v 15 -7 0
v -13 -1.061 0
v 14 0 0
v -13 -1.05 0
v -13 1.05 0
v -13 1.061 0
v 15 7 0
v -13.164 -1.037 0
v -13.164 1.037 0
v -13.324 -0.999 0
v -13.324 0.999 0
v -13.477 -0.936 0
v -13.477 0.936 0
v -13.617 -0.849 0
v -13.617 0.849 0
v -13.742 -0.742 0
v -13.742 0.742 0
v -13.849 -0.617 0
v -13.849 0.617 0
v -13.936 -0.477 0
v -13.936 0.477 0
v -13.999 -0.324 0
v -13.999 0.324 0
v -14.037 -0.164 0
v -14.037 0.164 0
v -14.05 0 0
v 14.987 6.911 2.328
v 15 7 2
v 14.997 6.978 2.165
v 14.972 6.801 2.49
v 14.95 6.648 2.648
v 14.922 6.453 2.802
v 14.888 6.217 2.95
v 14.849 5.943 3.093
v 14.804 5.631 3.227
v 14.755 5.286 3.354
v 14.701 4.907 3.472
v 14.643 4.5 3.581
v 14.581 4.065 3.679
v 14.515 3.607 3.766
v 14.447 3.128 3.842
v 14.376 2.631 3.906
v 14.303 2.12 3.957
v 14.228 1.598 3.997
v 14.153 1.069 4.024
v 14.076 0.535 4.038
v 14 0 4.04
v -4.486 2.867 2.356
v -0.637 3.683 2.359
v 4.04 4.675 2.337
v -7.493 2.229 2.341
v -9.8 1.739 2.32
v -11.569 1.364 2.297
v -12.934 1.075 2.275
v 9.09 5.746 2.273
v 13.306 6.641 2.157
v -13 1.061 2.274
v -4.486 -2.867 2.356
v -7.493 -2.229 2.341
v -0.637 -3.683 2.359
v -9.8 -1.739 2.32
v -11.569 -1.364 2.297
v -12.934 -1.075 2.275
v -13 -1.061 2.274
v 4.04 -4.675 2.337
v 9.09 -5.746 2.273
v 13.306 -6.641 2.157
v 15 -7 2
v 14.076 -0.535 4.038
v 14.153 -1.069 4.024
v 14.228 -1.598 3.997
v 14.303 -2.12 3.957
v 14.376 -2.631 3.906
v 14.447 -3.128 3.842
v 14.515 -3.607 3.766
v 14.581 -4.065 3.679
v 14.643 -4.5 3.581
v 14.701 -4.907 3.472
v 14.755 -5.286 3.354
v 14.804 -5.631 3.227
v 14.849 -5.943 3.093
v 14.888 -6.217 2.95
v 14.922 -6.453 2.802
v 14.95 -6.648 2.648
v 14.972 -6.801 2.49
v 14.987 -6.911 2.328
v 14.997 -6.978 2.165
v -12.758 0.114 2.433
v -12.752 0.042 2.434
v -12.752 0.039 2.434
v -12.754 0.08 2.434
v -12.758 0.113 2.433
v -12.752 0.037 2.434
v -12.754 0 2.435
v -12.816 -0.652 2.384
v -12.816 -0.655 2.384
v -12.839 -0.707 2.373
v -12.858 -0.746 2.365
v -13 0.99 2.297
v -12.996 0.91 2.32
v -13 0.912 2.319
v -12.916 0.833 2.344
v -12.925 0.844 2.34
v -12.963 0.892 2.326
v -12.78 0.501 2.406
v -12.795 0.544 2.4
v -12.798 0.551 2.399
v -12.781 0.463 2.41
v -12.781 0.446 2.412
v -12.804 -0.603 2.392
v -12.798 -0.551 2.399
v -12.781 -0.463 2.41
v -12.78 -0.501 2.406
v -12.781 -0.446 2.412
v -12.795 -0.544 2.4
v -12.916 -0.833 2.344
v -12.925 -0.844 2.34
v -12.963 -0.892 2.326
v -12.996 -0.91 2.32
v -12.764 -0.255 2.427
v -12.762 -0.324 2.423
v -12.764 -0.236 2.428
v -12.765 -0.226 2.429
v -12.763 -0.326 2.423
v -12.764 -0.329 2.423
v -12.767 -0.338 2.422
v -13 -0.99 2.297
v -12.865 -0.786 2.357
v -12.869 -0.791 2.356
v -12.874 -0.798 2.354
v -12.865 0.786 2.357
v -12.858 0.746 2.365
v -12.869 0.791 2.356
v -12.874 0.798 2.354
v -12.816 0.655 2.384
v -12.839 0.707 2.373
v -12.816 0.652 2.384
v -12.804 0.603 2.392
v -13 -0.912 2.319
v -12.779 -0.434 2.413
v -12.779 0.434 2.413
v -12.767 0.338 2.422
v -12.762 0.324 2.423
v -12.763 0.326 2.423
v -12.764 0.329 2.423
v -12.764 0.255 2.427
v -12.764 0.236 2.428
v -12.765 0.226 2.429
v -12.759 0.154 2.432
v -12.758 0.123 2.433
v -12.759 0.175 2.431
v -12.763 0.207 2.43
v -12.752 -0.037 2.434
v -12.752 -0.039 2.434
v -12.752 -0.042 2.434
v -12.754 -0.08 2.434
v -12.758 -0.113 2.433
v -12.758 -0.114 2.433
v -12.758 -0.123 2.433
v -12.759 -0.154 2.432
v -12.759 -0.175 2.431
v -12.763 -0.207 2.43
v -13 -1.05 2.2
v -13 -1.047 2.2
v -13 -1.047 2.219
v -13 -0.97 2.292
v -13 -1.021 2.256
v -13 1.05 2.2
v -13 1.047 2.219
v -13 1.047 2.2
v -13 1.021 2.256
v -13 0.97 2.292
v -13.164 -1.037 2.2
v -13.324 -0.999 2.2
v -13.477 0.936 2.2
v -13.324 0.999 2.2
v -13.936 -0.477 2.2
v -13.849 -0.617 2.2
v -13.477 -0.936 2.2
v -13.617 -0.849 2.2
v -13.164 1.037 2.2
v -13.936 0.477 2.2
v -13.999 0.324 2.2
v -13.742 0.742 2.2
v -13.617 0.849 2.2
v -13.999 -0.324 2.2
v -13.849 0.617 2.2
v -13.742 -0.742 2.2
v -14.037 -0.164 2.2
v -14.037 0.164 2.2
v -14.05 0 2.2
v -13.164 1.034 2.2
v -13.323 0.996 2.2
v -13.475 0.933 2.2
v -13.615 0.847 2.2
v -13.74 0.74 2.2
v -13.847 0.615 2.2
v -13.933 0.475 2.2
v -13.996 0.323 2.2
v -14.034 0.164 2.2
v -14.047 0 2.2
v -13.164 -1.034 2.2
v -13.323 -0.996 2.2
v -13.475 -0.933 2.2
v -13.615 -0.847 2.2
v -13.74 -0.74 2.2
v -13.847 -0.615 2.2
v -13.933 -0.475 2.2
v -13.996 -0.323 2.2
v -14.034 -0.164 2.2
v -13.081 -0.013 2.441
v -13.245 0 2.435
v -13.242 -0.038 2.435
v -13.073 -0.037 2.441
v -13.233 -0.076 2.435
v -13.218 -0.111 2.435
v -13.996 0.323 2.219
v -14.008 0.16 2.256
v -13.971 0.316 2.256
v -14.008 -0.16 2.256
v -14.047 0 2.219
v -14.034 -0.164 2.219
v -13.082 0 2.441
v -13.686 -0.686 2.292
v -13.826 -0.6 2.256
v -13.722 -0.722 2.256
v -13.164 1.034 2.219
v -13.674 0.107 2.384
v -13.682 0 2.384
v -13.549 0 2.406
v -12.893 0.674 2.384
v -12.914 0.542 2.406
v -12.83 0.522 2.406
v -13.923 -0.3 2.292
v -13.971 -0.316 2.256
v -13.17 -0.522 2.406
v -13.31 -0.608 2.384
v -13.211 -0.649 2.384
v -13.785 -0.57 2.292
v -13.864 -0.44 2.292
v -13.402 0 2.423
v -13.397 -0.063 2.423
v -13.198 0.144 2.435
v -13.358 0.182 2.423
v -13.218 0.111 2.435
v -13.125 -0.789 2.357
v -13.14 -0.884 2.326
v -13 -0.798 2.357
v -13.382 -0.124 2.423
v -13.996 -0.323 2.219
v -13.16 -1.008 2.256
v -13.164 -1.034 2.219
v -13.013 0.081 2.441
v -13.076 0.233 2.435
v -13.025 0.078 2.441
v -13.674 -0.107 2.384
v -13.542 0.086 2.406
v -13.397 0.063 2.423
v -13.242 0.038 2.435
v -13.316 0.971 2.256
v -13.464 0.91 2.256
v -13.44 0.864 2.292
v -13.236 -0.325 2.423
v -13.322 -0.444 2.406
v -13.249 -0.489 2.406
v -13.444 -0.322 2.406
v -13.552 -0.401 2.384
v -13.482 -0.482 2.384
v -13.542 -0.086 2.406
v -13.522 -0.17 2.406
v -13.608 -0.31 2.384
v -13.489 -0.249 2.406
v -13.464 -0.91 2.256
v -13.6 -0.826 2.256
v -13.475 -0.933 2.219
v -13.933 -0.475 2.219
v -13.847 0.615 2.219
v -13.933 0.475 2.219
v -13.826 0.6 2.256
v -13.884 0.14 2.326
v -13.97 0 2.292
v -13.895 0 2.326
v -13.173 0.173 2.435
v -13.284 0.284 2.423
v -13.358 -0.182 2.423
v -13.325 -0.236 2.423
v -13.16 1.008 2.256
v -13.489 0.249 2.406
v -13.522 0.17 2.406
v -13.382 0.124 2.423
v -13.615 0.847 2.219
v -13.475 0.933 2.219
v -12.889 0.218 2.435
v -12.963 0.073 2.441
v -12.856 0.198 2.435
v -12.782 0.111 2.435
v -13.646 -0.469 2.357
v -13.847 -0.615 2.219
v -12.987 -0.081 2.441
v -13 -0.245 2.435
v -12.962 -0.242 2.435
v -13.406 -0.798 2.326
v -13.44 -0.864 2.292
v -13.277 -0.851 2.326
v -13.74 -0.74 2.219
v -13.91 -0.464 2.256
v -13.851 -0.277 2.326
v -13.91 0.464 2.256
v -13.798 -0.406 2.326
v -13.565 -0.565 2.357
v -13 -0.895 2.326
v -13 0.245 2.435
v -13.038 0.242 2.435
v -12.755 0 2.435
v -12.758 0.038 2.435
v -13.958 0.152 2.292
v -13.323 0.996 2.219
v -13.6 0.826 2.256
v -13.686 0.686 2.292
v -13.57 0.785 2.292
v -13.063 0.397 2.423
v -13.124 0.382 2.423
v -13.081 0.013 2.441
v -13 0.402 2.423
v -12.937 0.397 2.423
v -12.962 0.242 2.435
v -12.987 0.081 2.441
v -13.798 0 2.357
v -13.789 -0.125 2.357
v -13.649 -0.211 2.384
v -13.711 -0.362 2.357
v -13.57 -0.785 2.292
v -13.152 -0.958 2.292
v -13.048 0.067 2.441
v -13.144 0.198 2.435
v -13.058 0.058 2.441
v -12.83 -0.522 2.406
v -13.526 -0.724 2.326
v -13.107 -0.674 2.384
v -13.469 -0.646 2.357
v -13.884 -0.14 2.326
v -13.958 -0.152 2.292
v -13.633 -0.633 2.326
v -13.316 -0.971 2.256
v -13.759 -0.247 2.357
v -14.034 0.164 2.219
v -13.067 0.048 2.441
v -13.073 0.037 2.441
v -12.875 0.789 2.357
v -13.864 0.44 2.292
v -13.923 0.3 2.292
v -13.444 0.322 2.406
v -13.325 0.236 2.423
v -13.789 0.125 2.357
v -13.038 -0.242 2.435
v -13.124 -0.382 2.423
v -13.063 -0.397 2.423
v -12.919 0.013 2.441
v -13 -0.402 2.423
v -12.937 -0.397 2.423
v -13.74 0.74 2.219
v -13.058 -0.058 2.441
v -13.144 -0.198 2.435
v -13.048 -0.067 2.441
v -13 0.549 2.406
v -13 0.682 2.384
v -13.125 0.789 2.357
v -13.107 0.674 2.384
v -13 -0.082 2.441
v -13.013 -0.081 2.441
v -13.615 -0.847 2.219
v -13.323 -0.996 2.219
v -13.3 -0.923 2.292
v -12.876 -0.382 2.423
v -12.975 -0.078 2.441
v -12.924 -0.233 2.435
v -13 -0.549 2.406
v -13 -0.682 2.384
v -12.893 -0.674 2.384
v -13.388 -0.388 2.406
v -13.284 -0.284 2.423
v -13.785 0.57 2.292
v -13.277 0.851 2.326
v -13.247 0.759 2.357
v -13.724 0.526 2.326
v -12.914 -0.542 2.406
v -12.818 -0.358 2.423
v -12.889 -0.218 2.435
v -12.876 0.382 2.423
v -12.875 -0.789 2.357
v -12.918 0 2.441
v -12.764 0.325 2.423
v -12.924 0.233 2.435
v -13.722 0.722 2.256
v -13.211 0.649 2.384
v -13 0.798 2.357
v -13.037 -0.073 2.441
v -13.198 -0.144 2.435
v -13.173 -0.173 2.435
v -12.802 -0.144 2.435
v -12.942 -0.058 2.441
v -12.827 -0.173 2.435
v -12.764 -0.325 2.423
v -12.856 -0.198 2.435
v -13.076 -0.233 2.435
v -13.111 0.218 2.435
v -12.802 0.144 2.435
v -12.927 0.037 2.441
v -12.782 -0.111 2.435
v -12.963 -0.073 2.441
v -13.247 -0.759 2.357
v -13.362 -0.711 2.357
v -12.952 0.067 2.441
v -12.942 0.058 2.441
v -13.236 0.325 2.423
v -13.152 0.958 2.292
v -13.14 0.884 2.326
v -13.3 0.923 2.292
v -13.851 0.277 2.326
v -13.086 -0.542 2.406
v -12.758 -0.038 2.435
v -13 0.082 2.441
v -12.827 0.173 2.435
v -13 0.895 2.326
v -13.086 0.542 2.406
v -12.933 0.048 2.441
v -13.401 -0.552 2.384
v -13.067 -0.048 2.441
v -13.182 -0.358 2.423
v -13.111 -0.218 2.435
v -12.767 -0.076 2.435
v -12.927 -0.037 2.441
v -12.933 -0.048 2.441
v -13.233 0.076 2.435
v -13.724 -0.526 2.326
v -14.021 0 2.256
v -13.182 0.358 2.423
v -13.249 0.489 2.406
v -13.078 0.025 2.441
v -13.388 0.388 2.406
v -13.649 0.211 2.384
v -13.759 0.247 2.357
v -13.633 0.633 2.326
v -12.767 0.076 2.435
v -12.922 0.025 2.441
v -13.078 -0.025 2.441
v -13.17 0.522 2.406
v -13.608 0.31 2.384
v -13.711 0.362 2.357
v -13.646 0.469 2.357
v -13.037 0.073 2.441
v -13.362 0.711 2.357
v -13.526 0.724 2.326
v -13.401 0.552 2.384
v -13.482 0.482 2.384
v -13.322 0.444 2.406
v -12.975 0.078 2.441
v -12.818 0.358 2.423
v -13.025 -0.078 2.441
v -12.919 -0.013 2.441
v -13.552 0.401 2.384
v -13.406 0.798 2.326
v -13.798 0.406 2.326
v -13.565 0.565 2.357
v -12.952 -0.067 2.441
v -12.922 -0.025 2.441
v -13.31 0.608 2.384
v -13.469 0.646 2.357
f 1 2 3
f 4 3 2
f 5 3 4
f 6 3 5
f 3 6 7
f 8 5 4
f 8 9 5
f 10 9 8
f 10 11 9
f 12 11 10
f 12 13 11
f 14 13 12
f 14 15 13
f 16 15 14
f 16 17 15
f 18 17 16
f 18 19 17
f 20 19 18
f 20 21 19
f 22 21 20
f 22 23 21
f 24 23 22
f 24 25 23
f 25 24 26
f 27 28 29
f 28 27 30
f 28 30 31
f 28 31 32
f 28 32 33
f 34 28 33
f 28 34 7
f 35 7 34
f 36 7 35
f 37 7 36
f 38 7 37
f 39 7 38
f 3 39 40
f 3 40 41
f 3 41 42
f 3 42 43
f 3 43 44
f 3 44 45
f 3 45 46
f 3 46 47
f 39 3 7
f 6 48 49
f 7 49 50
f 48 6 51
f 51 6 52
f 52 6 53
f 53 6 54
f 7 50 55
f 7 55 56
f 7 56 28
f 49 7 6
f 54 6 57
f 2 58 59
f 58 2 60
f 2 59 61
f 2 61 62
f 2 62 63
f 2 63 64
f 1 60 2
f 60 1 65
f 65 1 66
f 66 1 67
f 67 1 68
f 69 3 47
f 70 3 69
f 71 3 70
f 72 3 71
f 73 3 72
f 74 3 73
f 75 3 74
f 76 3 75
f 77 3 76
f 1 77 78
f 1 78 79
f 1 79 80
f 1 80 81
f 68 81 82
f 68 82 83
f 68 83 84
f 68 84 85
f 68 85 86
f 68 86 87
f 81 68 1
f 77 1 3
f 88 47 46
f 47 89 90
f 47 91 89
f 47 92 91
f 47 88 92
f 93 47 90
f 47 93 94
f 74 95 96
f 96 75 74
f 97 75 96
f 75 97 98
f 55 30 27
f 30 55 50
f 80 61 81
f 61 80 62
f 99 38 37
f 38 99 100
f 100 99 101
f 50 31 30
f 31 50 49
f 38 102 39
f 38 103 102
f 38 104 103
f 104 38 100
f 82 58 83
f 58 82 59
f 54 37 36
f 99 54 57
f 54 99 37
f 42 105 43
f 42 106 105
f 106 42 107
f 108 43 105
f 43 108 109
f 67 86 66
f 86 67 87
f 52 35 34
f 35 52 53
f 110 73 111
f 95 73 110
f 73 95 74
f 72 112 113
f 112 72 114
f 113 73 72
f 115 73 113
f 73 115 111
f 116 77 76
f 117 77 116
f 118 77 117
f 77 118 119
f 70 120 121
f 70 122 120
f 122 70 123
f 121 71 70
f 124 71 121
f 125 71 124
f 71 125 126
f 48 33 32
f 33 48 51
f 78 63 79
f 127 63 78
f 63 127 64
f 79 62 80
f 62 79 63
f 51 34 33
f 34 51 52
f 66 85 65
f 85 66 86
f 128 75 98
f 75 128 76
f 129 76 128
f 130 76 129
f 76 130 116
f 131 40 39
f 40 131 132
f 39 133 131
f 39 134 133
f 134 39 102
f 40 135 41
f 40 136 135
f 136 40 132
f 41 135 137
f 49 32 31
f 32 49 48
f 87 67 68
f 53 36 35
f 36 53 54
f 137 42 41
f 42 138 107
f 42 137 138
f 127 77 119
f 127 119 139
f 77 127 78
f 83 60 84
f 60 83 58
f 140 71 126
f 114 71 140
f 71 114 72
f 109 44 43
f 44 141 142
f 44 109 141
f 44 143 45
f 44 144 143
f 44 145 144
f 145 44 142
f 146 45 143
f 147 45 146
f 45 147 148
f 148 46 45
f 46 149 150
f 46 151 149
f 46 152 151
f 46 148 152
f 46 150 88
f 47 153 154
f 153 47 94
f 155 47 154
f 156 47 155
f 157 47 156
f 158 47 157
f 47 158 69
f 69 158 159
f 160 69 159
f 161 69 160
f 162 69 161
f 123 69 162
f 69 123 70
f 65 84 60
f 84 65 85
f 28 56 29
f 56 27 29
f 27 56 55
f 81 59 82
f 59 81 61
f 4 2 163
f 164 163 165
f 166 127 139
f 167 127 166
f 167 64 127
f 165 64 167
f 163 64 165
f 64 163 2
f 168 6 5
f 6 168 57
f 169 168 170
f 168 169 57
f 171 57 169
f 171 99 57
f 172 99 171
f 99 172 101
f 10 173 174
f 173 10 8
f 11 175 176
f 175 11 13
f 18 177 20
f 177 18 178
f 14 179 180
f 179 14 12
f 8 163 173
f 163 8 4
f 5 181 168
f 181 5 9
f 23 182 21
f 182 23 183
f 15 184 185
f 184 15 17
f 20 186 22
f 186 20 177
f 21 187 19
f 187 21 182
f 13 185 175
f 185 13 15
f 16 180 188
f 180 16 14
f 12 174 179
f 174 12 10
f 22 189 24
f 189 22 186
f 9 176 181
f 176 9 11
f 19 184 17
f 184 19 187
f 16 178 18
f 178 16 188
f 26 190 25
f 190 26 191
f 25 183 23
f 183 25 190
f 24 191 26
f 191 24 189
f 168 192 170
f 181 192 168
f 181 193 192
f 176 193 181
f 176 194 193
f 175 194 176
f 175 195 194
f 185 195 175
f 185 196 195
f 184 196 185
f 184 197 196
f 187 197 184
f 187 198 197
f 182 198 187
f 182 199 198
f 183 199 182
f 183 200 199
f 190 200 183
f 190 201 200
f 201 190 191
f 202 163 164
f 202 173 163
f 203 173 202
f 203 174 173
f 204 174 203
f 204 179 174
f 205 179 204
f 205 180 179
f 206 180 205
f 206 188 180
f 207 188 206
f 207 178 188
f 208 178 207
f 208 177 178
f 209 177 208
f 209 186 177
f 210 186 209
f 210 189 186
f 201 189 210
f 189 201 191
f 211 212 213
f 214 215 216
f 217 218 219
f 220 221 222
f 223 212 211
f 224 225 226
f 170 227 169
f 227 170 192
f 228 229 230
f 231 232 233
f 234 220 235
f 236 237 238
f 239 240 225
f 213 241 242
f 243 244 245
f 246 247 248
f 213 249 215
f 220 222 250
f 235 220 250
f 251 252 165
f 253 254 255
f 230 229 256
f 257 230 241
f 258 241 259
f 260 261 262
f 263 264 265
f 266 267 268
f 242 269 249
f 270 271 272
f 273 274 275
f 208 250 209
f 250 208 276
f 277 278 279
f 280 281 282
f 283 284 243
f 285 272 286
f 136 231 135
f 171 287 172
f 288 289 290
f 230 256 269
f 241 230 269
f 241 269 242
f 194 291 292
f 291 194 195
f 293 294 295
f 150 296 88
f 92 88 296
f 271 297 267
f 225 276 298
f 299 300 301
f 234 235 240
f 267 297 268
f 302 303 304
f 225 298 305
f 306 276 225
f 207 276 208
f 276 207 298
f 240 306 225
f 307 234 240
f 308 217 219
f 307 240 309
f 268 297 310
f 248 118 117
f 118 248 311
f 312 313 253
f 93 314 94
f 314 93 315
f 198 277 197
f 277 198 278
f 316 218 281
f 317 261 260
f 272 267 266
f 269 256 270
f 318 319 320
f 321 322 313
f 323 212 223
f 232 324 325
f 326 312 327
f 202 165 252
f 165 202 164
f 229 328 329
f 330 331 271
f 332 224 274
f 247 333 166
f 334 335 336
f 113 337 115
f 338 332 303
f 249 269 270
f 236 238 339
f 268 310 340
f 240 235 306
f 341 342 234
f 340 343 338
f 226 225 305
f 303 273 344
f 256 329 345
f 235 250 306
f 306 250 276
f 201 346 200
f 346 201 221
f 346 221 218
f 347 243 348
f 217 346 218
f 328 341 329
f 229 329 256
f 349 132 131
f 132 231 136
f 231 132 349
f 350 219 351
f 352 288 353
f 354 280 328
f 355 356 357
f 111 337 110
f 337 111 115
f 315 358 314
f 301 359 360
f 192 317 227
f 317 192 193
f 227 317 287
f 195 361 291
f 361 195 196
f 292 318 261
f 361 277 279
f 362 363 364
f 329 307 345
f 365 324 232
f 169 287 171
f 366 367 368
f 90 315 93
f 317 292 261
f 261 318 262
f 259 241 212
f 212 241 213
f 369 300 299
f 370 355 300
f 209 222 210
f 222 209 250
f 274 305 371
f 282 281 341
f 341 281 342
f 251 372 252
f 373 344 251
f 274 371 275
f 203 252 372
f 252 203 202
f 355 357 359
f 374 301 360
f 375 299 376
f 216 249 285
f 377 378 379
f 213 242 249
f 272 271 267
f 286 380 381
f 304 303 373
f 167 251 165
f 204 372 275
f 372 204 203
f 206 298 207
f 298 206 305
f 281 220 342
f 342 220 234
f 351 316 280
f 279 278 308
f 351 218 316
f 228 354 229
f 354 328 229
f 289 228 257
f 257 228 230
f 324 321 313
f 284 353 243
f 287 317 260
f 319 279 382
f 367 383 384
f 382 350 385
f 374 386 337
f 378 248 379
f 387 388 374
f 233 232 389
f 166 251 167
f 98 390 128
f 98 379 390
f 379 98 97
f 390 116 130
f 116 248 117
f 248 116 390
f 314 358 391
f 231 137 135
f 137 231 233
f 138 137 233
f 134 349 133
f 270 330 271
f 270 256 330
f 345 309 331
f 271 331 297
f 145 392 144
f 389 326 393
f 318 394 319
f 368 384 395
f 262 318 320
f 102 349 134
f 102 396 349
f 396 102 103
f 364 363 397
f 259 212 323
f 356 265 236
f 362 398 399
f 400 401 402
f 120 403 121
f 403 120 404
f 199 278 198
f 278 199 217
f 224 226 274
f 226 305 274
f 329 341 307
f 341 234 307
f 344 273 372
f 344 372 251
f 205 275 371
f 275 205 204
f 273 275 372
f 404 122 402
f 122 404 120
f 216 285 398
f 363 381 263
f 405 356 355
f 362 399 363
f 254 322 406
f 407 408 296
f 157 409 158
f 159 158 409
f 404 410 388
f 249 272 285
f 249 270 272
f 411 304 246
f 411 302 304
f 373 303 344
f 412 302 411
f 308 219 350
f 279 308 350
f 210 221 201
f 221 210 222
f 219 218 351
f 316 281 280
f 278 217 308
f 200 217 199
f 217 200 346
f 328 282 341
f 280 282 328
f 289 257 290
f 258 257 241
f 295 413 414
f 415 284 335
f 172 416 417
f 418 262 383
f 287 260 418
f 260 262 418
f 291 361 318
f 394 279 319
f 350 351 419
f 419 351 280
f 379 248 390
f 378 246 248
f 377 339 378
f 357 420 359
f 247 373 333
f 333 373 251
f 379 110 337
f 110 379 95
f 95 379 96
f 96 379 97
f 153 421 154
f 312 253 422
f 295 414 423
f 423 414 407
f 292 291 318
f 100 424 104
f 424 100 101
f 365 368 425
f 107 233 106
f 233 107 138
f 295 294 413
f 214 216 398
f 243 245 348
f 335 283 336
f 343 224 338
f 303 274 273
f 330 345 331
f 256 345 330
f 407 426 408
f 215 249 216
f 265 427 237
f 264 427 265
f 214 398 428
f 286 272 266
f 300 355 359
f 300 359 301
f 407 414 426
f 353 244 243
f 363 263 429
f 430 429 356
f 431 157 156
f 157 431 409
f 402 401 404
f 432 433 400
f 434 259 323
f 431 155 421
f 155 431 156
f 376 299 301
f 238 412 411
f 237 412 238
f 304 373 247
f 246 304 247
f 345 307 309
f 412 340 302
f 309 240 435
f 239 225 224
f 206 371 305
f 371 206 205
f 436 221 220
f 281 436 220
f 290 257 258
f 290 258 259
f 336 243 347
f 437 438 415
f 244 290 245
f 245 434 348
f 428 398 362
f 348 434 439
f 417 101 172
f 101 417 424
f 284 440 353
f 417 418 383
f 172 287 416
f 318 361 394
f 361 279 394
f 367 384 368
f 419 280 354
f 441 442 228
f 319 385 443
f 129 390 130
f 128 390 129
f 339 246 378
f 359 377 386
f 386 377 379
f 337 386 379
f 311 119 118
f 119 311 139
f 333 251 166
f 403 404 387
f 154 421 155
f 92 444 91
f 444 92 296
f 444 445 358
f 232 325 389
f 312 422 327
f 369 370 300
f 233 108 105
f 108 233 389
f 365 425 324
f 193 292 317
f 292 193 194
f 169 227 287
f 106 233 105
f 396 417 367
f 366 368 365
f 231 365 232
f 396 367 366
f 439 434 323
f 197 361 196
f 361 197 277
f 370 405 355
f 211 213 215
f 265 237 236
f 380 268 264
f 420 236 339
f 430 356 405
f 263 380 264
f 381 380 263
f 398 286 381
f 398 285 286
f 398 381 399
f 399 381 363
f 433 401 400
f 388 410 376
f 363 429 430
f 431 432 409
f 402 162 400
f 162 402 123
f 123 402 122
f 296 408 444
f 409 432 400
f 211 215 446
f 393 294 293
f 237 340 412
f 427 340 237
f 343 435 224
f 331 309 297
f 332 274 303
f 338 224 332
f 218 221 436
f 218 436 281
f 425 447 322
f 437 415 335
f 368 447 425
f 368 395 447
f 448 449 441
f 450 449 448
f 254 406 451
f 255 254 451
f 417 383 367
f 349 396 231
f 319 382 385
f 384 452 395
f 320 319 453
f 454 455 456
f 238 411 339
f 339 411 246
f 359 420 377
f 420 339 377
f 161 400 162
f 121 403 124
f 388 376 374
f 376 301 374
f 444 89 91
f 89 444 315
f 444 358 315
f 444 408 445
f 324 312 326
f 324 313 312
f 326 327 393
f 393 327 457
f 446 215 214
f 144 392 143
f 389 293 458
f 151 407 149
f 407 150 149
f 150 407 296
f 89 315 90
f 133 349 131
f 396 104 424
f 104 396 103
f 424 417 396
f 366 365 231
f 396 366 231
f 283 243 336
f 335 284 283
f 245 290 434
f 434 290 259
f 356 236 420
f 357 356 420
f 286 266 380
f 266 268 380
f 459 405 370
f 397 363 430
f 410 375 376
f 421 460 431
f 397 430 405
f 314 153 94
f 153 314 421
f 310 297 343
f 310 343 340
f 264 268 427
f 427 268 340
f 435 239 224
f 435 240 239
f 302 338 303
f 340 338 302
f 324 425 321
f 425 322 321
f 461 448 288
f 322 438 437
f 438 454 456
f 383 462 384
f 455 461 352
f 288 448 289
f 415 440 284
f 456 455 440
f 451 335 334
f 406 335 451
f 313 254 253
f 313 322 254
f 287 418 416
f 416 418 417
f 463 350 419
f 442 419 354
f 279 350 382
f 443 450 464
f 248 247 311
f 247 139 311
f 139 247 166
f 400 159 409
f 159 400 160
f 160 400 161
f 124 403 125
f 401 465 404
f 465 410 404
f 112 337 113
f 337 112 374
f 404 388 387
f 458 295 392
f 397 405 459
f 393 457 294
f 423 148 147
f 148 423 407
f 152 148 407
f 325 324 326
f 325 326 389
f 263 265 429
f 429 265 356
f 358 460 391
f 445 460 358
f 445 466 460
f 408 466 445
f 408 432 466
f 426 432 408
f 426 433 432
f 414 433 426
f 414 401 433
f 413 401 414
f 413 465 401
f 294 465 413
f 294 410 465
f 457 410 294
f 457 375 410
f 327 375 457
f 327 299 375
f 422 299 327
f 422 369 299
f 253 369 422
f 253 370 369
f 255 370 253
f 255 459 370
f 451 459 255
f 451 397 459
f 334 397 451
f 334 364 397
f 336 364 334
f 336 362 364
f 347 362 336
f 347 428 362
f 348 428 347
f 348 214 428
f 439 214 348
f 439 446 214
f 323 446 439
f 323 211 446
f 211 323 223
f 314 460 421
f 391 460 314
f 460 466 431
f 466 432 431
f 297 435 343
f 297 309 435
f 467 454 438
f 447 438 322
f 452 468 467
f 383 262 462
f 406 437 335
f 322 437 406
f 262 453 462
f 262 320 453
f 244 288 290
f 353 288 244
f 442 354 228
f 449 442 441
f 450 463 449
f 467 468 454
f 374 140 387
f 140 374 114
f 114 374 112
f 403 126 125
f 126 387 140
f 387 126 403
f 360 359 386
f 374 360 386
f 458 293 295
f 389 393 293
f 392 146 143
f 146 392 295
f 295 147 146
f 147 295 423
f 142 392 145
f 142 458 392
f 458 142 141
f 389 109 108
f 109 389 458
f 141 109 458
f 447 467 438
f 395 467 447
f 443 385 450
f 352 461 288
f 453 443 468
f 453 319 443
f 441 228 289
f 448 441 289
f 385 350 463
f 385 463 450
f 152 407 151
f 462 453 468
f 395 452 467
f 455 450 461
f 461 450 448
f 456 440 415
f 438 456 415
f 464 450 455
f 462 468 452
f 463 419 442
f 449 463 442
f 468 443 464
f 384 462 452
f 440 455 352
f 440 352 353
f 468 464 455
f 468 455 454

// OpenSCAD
module ship_shape(height) {
	linear_extrude(height) polygon([
		[-18, 0],
		[15, -7],
		[14, 0],
		[15, 7]
	]);
}

module ship() {
	difference() {
		union() {
			ship_shape(2);
			intersection() {
				ship_shape(20);
				translate([20, 0, 2]) scale([1, 1, 0.3]) rotate([0, -90, 0]) {
					cylinder(h = 40, r1 = 8, r2 = 0, $fn = 80);
				}
			}
		}
		translate([-20, -20, -20]) cube([7, 40, 40]);
	}
	translate([-13, 0, 0]) cylinder(r = 1.05, h = 2.2, $fn = 40);
	translate([-13, 0, 2.2]) scale([1, 1, 0.23]) sphere(r = 1.05, $fn = 40);
}

ship();
